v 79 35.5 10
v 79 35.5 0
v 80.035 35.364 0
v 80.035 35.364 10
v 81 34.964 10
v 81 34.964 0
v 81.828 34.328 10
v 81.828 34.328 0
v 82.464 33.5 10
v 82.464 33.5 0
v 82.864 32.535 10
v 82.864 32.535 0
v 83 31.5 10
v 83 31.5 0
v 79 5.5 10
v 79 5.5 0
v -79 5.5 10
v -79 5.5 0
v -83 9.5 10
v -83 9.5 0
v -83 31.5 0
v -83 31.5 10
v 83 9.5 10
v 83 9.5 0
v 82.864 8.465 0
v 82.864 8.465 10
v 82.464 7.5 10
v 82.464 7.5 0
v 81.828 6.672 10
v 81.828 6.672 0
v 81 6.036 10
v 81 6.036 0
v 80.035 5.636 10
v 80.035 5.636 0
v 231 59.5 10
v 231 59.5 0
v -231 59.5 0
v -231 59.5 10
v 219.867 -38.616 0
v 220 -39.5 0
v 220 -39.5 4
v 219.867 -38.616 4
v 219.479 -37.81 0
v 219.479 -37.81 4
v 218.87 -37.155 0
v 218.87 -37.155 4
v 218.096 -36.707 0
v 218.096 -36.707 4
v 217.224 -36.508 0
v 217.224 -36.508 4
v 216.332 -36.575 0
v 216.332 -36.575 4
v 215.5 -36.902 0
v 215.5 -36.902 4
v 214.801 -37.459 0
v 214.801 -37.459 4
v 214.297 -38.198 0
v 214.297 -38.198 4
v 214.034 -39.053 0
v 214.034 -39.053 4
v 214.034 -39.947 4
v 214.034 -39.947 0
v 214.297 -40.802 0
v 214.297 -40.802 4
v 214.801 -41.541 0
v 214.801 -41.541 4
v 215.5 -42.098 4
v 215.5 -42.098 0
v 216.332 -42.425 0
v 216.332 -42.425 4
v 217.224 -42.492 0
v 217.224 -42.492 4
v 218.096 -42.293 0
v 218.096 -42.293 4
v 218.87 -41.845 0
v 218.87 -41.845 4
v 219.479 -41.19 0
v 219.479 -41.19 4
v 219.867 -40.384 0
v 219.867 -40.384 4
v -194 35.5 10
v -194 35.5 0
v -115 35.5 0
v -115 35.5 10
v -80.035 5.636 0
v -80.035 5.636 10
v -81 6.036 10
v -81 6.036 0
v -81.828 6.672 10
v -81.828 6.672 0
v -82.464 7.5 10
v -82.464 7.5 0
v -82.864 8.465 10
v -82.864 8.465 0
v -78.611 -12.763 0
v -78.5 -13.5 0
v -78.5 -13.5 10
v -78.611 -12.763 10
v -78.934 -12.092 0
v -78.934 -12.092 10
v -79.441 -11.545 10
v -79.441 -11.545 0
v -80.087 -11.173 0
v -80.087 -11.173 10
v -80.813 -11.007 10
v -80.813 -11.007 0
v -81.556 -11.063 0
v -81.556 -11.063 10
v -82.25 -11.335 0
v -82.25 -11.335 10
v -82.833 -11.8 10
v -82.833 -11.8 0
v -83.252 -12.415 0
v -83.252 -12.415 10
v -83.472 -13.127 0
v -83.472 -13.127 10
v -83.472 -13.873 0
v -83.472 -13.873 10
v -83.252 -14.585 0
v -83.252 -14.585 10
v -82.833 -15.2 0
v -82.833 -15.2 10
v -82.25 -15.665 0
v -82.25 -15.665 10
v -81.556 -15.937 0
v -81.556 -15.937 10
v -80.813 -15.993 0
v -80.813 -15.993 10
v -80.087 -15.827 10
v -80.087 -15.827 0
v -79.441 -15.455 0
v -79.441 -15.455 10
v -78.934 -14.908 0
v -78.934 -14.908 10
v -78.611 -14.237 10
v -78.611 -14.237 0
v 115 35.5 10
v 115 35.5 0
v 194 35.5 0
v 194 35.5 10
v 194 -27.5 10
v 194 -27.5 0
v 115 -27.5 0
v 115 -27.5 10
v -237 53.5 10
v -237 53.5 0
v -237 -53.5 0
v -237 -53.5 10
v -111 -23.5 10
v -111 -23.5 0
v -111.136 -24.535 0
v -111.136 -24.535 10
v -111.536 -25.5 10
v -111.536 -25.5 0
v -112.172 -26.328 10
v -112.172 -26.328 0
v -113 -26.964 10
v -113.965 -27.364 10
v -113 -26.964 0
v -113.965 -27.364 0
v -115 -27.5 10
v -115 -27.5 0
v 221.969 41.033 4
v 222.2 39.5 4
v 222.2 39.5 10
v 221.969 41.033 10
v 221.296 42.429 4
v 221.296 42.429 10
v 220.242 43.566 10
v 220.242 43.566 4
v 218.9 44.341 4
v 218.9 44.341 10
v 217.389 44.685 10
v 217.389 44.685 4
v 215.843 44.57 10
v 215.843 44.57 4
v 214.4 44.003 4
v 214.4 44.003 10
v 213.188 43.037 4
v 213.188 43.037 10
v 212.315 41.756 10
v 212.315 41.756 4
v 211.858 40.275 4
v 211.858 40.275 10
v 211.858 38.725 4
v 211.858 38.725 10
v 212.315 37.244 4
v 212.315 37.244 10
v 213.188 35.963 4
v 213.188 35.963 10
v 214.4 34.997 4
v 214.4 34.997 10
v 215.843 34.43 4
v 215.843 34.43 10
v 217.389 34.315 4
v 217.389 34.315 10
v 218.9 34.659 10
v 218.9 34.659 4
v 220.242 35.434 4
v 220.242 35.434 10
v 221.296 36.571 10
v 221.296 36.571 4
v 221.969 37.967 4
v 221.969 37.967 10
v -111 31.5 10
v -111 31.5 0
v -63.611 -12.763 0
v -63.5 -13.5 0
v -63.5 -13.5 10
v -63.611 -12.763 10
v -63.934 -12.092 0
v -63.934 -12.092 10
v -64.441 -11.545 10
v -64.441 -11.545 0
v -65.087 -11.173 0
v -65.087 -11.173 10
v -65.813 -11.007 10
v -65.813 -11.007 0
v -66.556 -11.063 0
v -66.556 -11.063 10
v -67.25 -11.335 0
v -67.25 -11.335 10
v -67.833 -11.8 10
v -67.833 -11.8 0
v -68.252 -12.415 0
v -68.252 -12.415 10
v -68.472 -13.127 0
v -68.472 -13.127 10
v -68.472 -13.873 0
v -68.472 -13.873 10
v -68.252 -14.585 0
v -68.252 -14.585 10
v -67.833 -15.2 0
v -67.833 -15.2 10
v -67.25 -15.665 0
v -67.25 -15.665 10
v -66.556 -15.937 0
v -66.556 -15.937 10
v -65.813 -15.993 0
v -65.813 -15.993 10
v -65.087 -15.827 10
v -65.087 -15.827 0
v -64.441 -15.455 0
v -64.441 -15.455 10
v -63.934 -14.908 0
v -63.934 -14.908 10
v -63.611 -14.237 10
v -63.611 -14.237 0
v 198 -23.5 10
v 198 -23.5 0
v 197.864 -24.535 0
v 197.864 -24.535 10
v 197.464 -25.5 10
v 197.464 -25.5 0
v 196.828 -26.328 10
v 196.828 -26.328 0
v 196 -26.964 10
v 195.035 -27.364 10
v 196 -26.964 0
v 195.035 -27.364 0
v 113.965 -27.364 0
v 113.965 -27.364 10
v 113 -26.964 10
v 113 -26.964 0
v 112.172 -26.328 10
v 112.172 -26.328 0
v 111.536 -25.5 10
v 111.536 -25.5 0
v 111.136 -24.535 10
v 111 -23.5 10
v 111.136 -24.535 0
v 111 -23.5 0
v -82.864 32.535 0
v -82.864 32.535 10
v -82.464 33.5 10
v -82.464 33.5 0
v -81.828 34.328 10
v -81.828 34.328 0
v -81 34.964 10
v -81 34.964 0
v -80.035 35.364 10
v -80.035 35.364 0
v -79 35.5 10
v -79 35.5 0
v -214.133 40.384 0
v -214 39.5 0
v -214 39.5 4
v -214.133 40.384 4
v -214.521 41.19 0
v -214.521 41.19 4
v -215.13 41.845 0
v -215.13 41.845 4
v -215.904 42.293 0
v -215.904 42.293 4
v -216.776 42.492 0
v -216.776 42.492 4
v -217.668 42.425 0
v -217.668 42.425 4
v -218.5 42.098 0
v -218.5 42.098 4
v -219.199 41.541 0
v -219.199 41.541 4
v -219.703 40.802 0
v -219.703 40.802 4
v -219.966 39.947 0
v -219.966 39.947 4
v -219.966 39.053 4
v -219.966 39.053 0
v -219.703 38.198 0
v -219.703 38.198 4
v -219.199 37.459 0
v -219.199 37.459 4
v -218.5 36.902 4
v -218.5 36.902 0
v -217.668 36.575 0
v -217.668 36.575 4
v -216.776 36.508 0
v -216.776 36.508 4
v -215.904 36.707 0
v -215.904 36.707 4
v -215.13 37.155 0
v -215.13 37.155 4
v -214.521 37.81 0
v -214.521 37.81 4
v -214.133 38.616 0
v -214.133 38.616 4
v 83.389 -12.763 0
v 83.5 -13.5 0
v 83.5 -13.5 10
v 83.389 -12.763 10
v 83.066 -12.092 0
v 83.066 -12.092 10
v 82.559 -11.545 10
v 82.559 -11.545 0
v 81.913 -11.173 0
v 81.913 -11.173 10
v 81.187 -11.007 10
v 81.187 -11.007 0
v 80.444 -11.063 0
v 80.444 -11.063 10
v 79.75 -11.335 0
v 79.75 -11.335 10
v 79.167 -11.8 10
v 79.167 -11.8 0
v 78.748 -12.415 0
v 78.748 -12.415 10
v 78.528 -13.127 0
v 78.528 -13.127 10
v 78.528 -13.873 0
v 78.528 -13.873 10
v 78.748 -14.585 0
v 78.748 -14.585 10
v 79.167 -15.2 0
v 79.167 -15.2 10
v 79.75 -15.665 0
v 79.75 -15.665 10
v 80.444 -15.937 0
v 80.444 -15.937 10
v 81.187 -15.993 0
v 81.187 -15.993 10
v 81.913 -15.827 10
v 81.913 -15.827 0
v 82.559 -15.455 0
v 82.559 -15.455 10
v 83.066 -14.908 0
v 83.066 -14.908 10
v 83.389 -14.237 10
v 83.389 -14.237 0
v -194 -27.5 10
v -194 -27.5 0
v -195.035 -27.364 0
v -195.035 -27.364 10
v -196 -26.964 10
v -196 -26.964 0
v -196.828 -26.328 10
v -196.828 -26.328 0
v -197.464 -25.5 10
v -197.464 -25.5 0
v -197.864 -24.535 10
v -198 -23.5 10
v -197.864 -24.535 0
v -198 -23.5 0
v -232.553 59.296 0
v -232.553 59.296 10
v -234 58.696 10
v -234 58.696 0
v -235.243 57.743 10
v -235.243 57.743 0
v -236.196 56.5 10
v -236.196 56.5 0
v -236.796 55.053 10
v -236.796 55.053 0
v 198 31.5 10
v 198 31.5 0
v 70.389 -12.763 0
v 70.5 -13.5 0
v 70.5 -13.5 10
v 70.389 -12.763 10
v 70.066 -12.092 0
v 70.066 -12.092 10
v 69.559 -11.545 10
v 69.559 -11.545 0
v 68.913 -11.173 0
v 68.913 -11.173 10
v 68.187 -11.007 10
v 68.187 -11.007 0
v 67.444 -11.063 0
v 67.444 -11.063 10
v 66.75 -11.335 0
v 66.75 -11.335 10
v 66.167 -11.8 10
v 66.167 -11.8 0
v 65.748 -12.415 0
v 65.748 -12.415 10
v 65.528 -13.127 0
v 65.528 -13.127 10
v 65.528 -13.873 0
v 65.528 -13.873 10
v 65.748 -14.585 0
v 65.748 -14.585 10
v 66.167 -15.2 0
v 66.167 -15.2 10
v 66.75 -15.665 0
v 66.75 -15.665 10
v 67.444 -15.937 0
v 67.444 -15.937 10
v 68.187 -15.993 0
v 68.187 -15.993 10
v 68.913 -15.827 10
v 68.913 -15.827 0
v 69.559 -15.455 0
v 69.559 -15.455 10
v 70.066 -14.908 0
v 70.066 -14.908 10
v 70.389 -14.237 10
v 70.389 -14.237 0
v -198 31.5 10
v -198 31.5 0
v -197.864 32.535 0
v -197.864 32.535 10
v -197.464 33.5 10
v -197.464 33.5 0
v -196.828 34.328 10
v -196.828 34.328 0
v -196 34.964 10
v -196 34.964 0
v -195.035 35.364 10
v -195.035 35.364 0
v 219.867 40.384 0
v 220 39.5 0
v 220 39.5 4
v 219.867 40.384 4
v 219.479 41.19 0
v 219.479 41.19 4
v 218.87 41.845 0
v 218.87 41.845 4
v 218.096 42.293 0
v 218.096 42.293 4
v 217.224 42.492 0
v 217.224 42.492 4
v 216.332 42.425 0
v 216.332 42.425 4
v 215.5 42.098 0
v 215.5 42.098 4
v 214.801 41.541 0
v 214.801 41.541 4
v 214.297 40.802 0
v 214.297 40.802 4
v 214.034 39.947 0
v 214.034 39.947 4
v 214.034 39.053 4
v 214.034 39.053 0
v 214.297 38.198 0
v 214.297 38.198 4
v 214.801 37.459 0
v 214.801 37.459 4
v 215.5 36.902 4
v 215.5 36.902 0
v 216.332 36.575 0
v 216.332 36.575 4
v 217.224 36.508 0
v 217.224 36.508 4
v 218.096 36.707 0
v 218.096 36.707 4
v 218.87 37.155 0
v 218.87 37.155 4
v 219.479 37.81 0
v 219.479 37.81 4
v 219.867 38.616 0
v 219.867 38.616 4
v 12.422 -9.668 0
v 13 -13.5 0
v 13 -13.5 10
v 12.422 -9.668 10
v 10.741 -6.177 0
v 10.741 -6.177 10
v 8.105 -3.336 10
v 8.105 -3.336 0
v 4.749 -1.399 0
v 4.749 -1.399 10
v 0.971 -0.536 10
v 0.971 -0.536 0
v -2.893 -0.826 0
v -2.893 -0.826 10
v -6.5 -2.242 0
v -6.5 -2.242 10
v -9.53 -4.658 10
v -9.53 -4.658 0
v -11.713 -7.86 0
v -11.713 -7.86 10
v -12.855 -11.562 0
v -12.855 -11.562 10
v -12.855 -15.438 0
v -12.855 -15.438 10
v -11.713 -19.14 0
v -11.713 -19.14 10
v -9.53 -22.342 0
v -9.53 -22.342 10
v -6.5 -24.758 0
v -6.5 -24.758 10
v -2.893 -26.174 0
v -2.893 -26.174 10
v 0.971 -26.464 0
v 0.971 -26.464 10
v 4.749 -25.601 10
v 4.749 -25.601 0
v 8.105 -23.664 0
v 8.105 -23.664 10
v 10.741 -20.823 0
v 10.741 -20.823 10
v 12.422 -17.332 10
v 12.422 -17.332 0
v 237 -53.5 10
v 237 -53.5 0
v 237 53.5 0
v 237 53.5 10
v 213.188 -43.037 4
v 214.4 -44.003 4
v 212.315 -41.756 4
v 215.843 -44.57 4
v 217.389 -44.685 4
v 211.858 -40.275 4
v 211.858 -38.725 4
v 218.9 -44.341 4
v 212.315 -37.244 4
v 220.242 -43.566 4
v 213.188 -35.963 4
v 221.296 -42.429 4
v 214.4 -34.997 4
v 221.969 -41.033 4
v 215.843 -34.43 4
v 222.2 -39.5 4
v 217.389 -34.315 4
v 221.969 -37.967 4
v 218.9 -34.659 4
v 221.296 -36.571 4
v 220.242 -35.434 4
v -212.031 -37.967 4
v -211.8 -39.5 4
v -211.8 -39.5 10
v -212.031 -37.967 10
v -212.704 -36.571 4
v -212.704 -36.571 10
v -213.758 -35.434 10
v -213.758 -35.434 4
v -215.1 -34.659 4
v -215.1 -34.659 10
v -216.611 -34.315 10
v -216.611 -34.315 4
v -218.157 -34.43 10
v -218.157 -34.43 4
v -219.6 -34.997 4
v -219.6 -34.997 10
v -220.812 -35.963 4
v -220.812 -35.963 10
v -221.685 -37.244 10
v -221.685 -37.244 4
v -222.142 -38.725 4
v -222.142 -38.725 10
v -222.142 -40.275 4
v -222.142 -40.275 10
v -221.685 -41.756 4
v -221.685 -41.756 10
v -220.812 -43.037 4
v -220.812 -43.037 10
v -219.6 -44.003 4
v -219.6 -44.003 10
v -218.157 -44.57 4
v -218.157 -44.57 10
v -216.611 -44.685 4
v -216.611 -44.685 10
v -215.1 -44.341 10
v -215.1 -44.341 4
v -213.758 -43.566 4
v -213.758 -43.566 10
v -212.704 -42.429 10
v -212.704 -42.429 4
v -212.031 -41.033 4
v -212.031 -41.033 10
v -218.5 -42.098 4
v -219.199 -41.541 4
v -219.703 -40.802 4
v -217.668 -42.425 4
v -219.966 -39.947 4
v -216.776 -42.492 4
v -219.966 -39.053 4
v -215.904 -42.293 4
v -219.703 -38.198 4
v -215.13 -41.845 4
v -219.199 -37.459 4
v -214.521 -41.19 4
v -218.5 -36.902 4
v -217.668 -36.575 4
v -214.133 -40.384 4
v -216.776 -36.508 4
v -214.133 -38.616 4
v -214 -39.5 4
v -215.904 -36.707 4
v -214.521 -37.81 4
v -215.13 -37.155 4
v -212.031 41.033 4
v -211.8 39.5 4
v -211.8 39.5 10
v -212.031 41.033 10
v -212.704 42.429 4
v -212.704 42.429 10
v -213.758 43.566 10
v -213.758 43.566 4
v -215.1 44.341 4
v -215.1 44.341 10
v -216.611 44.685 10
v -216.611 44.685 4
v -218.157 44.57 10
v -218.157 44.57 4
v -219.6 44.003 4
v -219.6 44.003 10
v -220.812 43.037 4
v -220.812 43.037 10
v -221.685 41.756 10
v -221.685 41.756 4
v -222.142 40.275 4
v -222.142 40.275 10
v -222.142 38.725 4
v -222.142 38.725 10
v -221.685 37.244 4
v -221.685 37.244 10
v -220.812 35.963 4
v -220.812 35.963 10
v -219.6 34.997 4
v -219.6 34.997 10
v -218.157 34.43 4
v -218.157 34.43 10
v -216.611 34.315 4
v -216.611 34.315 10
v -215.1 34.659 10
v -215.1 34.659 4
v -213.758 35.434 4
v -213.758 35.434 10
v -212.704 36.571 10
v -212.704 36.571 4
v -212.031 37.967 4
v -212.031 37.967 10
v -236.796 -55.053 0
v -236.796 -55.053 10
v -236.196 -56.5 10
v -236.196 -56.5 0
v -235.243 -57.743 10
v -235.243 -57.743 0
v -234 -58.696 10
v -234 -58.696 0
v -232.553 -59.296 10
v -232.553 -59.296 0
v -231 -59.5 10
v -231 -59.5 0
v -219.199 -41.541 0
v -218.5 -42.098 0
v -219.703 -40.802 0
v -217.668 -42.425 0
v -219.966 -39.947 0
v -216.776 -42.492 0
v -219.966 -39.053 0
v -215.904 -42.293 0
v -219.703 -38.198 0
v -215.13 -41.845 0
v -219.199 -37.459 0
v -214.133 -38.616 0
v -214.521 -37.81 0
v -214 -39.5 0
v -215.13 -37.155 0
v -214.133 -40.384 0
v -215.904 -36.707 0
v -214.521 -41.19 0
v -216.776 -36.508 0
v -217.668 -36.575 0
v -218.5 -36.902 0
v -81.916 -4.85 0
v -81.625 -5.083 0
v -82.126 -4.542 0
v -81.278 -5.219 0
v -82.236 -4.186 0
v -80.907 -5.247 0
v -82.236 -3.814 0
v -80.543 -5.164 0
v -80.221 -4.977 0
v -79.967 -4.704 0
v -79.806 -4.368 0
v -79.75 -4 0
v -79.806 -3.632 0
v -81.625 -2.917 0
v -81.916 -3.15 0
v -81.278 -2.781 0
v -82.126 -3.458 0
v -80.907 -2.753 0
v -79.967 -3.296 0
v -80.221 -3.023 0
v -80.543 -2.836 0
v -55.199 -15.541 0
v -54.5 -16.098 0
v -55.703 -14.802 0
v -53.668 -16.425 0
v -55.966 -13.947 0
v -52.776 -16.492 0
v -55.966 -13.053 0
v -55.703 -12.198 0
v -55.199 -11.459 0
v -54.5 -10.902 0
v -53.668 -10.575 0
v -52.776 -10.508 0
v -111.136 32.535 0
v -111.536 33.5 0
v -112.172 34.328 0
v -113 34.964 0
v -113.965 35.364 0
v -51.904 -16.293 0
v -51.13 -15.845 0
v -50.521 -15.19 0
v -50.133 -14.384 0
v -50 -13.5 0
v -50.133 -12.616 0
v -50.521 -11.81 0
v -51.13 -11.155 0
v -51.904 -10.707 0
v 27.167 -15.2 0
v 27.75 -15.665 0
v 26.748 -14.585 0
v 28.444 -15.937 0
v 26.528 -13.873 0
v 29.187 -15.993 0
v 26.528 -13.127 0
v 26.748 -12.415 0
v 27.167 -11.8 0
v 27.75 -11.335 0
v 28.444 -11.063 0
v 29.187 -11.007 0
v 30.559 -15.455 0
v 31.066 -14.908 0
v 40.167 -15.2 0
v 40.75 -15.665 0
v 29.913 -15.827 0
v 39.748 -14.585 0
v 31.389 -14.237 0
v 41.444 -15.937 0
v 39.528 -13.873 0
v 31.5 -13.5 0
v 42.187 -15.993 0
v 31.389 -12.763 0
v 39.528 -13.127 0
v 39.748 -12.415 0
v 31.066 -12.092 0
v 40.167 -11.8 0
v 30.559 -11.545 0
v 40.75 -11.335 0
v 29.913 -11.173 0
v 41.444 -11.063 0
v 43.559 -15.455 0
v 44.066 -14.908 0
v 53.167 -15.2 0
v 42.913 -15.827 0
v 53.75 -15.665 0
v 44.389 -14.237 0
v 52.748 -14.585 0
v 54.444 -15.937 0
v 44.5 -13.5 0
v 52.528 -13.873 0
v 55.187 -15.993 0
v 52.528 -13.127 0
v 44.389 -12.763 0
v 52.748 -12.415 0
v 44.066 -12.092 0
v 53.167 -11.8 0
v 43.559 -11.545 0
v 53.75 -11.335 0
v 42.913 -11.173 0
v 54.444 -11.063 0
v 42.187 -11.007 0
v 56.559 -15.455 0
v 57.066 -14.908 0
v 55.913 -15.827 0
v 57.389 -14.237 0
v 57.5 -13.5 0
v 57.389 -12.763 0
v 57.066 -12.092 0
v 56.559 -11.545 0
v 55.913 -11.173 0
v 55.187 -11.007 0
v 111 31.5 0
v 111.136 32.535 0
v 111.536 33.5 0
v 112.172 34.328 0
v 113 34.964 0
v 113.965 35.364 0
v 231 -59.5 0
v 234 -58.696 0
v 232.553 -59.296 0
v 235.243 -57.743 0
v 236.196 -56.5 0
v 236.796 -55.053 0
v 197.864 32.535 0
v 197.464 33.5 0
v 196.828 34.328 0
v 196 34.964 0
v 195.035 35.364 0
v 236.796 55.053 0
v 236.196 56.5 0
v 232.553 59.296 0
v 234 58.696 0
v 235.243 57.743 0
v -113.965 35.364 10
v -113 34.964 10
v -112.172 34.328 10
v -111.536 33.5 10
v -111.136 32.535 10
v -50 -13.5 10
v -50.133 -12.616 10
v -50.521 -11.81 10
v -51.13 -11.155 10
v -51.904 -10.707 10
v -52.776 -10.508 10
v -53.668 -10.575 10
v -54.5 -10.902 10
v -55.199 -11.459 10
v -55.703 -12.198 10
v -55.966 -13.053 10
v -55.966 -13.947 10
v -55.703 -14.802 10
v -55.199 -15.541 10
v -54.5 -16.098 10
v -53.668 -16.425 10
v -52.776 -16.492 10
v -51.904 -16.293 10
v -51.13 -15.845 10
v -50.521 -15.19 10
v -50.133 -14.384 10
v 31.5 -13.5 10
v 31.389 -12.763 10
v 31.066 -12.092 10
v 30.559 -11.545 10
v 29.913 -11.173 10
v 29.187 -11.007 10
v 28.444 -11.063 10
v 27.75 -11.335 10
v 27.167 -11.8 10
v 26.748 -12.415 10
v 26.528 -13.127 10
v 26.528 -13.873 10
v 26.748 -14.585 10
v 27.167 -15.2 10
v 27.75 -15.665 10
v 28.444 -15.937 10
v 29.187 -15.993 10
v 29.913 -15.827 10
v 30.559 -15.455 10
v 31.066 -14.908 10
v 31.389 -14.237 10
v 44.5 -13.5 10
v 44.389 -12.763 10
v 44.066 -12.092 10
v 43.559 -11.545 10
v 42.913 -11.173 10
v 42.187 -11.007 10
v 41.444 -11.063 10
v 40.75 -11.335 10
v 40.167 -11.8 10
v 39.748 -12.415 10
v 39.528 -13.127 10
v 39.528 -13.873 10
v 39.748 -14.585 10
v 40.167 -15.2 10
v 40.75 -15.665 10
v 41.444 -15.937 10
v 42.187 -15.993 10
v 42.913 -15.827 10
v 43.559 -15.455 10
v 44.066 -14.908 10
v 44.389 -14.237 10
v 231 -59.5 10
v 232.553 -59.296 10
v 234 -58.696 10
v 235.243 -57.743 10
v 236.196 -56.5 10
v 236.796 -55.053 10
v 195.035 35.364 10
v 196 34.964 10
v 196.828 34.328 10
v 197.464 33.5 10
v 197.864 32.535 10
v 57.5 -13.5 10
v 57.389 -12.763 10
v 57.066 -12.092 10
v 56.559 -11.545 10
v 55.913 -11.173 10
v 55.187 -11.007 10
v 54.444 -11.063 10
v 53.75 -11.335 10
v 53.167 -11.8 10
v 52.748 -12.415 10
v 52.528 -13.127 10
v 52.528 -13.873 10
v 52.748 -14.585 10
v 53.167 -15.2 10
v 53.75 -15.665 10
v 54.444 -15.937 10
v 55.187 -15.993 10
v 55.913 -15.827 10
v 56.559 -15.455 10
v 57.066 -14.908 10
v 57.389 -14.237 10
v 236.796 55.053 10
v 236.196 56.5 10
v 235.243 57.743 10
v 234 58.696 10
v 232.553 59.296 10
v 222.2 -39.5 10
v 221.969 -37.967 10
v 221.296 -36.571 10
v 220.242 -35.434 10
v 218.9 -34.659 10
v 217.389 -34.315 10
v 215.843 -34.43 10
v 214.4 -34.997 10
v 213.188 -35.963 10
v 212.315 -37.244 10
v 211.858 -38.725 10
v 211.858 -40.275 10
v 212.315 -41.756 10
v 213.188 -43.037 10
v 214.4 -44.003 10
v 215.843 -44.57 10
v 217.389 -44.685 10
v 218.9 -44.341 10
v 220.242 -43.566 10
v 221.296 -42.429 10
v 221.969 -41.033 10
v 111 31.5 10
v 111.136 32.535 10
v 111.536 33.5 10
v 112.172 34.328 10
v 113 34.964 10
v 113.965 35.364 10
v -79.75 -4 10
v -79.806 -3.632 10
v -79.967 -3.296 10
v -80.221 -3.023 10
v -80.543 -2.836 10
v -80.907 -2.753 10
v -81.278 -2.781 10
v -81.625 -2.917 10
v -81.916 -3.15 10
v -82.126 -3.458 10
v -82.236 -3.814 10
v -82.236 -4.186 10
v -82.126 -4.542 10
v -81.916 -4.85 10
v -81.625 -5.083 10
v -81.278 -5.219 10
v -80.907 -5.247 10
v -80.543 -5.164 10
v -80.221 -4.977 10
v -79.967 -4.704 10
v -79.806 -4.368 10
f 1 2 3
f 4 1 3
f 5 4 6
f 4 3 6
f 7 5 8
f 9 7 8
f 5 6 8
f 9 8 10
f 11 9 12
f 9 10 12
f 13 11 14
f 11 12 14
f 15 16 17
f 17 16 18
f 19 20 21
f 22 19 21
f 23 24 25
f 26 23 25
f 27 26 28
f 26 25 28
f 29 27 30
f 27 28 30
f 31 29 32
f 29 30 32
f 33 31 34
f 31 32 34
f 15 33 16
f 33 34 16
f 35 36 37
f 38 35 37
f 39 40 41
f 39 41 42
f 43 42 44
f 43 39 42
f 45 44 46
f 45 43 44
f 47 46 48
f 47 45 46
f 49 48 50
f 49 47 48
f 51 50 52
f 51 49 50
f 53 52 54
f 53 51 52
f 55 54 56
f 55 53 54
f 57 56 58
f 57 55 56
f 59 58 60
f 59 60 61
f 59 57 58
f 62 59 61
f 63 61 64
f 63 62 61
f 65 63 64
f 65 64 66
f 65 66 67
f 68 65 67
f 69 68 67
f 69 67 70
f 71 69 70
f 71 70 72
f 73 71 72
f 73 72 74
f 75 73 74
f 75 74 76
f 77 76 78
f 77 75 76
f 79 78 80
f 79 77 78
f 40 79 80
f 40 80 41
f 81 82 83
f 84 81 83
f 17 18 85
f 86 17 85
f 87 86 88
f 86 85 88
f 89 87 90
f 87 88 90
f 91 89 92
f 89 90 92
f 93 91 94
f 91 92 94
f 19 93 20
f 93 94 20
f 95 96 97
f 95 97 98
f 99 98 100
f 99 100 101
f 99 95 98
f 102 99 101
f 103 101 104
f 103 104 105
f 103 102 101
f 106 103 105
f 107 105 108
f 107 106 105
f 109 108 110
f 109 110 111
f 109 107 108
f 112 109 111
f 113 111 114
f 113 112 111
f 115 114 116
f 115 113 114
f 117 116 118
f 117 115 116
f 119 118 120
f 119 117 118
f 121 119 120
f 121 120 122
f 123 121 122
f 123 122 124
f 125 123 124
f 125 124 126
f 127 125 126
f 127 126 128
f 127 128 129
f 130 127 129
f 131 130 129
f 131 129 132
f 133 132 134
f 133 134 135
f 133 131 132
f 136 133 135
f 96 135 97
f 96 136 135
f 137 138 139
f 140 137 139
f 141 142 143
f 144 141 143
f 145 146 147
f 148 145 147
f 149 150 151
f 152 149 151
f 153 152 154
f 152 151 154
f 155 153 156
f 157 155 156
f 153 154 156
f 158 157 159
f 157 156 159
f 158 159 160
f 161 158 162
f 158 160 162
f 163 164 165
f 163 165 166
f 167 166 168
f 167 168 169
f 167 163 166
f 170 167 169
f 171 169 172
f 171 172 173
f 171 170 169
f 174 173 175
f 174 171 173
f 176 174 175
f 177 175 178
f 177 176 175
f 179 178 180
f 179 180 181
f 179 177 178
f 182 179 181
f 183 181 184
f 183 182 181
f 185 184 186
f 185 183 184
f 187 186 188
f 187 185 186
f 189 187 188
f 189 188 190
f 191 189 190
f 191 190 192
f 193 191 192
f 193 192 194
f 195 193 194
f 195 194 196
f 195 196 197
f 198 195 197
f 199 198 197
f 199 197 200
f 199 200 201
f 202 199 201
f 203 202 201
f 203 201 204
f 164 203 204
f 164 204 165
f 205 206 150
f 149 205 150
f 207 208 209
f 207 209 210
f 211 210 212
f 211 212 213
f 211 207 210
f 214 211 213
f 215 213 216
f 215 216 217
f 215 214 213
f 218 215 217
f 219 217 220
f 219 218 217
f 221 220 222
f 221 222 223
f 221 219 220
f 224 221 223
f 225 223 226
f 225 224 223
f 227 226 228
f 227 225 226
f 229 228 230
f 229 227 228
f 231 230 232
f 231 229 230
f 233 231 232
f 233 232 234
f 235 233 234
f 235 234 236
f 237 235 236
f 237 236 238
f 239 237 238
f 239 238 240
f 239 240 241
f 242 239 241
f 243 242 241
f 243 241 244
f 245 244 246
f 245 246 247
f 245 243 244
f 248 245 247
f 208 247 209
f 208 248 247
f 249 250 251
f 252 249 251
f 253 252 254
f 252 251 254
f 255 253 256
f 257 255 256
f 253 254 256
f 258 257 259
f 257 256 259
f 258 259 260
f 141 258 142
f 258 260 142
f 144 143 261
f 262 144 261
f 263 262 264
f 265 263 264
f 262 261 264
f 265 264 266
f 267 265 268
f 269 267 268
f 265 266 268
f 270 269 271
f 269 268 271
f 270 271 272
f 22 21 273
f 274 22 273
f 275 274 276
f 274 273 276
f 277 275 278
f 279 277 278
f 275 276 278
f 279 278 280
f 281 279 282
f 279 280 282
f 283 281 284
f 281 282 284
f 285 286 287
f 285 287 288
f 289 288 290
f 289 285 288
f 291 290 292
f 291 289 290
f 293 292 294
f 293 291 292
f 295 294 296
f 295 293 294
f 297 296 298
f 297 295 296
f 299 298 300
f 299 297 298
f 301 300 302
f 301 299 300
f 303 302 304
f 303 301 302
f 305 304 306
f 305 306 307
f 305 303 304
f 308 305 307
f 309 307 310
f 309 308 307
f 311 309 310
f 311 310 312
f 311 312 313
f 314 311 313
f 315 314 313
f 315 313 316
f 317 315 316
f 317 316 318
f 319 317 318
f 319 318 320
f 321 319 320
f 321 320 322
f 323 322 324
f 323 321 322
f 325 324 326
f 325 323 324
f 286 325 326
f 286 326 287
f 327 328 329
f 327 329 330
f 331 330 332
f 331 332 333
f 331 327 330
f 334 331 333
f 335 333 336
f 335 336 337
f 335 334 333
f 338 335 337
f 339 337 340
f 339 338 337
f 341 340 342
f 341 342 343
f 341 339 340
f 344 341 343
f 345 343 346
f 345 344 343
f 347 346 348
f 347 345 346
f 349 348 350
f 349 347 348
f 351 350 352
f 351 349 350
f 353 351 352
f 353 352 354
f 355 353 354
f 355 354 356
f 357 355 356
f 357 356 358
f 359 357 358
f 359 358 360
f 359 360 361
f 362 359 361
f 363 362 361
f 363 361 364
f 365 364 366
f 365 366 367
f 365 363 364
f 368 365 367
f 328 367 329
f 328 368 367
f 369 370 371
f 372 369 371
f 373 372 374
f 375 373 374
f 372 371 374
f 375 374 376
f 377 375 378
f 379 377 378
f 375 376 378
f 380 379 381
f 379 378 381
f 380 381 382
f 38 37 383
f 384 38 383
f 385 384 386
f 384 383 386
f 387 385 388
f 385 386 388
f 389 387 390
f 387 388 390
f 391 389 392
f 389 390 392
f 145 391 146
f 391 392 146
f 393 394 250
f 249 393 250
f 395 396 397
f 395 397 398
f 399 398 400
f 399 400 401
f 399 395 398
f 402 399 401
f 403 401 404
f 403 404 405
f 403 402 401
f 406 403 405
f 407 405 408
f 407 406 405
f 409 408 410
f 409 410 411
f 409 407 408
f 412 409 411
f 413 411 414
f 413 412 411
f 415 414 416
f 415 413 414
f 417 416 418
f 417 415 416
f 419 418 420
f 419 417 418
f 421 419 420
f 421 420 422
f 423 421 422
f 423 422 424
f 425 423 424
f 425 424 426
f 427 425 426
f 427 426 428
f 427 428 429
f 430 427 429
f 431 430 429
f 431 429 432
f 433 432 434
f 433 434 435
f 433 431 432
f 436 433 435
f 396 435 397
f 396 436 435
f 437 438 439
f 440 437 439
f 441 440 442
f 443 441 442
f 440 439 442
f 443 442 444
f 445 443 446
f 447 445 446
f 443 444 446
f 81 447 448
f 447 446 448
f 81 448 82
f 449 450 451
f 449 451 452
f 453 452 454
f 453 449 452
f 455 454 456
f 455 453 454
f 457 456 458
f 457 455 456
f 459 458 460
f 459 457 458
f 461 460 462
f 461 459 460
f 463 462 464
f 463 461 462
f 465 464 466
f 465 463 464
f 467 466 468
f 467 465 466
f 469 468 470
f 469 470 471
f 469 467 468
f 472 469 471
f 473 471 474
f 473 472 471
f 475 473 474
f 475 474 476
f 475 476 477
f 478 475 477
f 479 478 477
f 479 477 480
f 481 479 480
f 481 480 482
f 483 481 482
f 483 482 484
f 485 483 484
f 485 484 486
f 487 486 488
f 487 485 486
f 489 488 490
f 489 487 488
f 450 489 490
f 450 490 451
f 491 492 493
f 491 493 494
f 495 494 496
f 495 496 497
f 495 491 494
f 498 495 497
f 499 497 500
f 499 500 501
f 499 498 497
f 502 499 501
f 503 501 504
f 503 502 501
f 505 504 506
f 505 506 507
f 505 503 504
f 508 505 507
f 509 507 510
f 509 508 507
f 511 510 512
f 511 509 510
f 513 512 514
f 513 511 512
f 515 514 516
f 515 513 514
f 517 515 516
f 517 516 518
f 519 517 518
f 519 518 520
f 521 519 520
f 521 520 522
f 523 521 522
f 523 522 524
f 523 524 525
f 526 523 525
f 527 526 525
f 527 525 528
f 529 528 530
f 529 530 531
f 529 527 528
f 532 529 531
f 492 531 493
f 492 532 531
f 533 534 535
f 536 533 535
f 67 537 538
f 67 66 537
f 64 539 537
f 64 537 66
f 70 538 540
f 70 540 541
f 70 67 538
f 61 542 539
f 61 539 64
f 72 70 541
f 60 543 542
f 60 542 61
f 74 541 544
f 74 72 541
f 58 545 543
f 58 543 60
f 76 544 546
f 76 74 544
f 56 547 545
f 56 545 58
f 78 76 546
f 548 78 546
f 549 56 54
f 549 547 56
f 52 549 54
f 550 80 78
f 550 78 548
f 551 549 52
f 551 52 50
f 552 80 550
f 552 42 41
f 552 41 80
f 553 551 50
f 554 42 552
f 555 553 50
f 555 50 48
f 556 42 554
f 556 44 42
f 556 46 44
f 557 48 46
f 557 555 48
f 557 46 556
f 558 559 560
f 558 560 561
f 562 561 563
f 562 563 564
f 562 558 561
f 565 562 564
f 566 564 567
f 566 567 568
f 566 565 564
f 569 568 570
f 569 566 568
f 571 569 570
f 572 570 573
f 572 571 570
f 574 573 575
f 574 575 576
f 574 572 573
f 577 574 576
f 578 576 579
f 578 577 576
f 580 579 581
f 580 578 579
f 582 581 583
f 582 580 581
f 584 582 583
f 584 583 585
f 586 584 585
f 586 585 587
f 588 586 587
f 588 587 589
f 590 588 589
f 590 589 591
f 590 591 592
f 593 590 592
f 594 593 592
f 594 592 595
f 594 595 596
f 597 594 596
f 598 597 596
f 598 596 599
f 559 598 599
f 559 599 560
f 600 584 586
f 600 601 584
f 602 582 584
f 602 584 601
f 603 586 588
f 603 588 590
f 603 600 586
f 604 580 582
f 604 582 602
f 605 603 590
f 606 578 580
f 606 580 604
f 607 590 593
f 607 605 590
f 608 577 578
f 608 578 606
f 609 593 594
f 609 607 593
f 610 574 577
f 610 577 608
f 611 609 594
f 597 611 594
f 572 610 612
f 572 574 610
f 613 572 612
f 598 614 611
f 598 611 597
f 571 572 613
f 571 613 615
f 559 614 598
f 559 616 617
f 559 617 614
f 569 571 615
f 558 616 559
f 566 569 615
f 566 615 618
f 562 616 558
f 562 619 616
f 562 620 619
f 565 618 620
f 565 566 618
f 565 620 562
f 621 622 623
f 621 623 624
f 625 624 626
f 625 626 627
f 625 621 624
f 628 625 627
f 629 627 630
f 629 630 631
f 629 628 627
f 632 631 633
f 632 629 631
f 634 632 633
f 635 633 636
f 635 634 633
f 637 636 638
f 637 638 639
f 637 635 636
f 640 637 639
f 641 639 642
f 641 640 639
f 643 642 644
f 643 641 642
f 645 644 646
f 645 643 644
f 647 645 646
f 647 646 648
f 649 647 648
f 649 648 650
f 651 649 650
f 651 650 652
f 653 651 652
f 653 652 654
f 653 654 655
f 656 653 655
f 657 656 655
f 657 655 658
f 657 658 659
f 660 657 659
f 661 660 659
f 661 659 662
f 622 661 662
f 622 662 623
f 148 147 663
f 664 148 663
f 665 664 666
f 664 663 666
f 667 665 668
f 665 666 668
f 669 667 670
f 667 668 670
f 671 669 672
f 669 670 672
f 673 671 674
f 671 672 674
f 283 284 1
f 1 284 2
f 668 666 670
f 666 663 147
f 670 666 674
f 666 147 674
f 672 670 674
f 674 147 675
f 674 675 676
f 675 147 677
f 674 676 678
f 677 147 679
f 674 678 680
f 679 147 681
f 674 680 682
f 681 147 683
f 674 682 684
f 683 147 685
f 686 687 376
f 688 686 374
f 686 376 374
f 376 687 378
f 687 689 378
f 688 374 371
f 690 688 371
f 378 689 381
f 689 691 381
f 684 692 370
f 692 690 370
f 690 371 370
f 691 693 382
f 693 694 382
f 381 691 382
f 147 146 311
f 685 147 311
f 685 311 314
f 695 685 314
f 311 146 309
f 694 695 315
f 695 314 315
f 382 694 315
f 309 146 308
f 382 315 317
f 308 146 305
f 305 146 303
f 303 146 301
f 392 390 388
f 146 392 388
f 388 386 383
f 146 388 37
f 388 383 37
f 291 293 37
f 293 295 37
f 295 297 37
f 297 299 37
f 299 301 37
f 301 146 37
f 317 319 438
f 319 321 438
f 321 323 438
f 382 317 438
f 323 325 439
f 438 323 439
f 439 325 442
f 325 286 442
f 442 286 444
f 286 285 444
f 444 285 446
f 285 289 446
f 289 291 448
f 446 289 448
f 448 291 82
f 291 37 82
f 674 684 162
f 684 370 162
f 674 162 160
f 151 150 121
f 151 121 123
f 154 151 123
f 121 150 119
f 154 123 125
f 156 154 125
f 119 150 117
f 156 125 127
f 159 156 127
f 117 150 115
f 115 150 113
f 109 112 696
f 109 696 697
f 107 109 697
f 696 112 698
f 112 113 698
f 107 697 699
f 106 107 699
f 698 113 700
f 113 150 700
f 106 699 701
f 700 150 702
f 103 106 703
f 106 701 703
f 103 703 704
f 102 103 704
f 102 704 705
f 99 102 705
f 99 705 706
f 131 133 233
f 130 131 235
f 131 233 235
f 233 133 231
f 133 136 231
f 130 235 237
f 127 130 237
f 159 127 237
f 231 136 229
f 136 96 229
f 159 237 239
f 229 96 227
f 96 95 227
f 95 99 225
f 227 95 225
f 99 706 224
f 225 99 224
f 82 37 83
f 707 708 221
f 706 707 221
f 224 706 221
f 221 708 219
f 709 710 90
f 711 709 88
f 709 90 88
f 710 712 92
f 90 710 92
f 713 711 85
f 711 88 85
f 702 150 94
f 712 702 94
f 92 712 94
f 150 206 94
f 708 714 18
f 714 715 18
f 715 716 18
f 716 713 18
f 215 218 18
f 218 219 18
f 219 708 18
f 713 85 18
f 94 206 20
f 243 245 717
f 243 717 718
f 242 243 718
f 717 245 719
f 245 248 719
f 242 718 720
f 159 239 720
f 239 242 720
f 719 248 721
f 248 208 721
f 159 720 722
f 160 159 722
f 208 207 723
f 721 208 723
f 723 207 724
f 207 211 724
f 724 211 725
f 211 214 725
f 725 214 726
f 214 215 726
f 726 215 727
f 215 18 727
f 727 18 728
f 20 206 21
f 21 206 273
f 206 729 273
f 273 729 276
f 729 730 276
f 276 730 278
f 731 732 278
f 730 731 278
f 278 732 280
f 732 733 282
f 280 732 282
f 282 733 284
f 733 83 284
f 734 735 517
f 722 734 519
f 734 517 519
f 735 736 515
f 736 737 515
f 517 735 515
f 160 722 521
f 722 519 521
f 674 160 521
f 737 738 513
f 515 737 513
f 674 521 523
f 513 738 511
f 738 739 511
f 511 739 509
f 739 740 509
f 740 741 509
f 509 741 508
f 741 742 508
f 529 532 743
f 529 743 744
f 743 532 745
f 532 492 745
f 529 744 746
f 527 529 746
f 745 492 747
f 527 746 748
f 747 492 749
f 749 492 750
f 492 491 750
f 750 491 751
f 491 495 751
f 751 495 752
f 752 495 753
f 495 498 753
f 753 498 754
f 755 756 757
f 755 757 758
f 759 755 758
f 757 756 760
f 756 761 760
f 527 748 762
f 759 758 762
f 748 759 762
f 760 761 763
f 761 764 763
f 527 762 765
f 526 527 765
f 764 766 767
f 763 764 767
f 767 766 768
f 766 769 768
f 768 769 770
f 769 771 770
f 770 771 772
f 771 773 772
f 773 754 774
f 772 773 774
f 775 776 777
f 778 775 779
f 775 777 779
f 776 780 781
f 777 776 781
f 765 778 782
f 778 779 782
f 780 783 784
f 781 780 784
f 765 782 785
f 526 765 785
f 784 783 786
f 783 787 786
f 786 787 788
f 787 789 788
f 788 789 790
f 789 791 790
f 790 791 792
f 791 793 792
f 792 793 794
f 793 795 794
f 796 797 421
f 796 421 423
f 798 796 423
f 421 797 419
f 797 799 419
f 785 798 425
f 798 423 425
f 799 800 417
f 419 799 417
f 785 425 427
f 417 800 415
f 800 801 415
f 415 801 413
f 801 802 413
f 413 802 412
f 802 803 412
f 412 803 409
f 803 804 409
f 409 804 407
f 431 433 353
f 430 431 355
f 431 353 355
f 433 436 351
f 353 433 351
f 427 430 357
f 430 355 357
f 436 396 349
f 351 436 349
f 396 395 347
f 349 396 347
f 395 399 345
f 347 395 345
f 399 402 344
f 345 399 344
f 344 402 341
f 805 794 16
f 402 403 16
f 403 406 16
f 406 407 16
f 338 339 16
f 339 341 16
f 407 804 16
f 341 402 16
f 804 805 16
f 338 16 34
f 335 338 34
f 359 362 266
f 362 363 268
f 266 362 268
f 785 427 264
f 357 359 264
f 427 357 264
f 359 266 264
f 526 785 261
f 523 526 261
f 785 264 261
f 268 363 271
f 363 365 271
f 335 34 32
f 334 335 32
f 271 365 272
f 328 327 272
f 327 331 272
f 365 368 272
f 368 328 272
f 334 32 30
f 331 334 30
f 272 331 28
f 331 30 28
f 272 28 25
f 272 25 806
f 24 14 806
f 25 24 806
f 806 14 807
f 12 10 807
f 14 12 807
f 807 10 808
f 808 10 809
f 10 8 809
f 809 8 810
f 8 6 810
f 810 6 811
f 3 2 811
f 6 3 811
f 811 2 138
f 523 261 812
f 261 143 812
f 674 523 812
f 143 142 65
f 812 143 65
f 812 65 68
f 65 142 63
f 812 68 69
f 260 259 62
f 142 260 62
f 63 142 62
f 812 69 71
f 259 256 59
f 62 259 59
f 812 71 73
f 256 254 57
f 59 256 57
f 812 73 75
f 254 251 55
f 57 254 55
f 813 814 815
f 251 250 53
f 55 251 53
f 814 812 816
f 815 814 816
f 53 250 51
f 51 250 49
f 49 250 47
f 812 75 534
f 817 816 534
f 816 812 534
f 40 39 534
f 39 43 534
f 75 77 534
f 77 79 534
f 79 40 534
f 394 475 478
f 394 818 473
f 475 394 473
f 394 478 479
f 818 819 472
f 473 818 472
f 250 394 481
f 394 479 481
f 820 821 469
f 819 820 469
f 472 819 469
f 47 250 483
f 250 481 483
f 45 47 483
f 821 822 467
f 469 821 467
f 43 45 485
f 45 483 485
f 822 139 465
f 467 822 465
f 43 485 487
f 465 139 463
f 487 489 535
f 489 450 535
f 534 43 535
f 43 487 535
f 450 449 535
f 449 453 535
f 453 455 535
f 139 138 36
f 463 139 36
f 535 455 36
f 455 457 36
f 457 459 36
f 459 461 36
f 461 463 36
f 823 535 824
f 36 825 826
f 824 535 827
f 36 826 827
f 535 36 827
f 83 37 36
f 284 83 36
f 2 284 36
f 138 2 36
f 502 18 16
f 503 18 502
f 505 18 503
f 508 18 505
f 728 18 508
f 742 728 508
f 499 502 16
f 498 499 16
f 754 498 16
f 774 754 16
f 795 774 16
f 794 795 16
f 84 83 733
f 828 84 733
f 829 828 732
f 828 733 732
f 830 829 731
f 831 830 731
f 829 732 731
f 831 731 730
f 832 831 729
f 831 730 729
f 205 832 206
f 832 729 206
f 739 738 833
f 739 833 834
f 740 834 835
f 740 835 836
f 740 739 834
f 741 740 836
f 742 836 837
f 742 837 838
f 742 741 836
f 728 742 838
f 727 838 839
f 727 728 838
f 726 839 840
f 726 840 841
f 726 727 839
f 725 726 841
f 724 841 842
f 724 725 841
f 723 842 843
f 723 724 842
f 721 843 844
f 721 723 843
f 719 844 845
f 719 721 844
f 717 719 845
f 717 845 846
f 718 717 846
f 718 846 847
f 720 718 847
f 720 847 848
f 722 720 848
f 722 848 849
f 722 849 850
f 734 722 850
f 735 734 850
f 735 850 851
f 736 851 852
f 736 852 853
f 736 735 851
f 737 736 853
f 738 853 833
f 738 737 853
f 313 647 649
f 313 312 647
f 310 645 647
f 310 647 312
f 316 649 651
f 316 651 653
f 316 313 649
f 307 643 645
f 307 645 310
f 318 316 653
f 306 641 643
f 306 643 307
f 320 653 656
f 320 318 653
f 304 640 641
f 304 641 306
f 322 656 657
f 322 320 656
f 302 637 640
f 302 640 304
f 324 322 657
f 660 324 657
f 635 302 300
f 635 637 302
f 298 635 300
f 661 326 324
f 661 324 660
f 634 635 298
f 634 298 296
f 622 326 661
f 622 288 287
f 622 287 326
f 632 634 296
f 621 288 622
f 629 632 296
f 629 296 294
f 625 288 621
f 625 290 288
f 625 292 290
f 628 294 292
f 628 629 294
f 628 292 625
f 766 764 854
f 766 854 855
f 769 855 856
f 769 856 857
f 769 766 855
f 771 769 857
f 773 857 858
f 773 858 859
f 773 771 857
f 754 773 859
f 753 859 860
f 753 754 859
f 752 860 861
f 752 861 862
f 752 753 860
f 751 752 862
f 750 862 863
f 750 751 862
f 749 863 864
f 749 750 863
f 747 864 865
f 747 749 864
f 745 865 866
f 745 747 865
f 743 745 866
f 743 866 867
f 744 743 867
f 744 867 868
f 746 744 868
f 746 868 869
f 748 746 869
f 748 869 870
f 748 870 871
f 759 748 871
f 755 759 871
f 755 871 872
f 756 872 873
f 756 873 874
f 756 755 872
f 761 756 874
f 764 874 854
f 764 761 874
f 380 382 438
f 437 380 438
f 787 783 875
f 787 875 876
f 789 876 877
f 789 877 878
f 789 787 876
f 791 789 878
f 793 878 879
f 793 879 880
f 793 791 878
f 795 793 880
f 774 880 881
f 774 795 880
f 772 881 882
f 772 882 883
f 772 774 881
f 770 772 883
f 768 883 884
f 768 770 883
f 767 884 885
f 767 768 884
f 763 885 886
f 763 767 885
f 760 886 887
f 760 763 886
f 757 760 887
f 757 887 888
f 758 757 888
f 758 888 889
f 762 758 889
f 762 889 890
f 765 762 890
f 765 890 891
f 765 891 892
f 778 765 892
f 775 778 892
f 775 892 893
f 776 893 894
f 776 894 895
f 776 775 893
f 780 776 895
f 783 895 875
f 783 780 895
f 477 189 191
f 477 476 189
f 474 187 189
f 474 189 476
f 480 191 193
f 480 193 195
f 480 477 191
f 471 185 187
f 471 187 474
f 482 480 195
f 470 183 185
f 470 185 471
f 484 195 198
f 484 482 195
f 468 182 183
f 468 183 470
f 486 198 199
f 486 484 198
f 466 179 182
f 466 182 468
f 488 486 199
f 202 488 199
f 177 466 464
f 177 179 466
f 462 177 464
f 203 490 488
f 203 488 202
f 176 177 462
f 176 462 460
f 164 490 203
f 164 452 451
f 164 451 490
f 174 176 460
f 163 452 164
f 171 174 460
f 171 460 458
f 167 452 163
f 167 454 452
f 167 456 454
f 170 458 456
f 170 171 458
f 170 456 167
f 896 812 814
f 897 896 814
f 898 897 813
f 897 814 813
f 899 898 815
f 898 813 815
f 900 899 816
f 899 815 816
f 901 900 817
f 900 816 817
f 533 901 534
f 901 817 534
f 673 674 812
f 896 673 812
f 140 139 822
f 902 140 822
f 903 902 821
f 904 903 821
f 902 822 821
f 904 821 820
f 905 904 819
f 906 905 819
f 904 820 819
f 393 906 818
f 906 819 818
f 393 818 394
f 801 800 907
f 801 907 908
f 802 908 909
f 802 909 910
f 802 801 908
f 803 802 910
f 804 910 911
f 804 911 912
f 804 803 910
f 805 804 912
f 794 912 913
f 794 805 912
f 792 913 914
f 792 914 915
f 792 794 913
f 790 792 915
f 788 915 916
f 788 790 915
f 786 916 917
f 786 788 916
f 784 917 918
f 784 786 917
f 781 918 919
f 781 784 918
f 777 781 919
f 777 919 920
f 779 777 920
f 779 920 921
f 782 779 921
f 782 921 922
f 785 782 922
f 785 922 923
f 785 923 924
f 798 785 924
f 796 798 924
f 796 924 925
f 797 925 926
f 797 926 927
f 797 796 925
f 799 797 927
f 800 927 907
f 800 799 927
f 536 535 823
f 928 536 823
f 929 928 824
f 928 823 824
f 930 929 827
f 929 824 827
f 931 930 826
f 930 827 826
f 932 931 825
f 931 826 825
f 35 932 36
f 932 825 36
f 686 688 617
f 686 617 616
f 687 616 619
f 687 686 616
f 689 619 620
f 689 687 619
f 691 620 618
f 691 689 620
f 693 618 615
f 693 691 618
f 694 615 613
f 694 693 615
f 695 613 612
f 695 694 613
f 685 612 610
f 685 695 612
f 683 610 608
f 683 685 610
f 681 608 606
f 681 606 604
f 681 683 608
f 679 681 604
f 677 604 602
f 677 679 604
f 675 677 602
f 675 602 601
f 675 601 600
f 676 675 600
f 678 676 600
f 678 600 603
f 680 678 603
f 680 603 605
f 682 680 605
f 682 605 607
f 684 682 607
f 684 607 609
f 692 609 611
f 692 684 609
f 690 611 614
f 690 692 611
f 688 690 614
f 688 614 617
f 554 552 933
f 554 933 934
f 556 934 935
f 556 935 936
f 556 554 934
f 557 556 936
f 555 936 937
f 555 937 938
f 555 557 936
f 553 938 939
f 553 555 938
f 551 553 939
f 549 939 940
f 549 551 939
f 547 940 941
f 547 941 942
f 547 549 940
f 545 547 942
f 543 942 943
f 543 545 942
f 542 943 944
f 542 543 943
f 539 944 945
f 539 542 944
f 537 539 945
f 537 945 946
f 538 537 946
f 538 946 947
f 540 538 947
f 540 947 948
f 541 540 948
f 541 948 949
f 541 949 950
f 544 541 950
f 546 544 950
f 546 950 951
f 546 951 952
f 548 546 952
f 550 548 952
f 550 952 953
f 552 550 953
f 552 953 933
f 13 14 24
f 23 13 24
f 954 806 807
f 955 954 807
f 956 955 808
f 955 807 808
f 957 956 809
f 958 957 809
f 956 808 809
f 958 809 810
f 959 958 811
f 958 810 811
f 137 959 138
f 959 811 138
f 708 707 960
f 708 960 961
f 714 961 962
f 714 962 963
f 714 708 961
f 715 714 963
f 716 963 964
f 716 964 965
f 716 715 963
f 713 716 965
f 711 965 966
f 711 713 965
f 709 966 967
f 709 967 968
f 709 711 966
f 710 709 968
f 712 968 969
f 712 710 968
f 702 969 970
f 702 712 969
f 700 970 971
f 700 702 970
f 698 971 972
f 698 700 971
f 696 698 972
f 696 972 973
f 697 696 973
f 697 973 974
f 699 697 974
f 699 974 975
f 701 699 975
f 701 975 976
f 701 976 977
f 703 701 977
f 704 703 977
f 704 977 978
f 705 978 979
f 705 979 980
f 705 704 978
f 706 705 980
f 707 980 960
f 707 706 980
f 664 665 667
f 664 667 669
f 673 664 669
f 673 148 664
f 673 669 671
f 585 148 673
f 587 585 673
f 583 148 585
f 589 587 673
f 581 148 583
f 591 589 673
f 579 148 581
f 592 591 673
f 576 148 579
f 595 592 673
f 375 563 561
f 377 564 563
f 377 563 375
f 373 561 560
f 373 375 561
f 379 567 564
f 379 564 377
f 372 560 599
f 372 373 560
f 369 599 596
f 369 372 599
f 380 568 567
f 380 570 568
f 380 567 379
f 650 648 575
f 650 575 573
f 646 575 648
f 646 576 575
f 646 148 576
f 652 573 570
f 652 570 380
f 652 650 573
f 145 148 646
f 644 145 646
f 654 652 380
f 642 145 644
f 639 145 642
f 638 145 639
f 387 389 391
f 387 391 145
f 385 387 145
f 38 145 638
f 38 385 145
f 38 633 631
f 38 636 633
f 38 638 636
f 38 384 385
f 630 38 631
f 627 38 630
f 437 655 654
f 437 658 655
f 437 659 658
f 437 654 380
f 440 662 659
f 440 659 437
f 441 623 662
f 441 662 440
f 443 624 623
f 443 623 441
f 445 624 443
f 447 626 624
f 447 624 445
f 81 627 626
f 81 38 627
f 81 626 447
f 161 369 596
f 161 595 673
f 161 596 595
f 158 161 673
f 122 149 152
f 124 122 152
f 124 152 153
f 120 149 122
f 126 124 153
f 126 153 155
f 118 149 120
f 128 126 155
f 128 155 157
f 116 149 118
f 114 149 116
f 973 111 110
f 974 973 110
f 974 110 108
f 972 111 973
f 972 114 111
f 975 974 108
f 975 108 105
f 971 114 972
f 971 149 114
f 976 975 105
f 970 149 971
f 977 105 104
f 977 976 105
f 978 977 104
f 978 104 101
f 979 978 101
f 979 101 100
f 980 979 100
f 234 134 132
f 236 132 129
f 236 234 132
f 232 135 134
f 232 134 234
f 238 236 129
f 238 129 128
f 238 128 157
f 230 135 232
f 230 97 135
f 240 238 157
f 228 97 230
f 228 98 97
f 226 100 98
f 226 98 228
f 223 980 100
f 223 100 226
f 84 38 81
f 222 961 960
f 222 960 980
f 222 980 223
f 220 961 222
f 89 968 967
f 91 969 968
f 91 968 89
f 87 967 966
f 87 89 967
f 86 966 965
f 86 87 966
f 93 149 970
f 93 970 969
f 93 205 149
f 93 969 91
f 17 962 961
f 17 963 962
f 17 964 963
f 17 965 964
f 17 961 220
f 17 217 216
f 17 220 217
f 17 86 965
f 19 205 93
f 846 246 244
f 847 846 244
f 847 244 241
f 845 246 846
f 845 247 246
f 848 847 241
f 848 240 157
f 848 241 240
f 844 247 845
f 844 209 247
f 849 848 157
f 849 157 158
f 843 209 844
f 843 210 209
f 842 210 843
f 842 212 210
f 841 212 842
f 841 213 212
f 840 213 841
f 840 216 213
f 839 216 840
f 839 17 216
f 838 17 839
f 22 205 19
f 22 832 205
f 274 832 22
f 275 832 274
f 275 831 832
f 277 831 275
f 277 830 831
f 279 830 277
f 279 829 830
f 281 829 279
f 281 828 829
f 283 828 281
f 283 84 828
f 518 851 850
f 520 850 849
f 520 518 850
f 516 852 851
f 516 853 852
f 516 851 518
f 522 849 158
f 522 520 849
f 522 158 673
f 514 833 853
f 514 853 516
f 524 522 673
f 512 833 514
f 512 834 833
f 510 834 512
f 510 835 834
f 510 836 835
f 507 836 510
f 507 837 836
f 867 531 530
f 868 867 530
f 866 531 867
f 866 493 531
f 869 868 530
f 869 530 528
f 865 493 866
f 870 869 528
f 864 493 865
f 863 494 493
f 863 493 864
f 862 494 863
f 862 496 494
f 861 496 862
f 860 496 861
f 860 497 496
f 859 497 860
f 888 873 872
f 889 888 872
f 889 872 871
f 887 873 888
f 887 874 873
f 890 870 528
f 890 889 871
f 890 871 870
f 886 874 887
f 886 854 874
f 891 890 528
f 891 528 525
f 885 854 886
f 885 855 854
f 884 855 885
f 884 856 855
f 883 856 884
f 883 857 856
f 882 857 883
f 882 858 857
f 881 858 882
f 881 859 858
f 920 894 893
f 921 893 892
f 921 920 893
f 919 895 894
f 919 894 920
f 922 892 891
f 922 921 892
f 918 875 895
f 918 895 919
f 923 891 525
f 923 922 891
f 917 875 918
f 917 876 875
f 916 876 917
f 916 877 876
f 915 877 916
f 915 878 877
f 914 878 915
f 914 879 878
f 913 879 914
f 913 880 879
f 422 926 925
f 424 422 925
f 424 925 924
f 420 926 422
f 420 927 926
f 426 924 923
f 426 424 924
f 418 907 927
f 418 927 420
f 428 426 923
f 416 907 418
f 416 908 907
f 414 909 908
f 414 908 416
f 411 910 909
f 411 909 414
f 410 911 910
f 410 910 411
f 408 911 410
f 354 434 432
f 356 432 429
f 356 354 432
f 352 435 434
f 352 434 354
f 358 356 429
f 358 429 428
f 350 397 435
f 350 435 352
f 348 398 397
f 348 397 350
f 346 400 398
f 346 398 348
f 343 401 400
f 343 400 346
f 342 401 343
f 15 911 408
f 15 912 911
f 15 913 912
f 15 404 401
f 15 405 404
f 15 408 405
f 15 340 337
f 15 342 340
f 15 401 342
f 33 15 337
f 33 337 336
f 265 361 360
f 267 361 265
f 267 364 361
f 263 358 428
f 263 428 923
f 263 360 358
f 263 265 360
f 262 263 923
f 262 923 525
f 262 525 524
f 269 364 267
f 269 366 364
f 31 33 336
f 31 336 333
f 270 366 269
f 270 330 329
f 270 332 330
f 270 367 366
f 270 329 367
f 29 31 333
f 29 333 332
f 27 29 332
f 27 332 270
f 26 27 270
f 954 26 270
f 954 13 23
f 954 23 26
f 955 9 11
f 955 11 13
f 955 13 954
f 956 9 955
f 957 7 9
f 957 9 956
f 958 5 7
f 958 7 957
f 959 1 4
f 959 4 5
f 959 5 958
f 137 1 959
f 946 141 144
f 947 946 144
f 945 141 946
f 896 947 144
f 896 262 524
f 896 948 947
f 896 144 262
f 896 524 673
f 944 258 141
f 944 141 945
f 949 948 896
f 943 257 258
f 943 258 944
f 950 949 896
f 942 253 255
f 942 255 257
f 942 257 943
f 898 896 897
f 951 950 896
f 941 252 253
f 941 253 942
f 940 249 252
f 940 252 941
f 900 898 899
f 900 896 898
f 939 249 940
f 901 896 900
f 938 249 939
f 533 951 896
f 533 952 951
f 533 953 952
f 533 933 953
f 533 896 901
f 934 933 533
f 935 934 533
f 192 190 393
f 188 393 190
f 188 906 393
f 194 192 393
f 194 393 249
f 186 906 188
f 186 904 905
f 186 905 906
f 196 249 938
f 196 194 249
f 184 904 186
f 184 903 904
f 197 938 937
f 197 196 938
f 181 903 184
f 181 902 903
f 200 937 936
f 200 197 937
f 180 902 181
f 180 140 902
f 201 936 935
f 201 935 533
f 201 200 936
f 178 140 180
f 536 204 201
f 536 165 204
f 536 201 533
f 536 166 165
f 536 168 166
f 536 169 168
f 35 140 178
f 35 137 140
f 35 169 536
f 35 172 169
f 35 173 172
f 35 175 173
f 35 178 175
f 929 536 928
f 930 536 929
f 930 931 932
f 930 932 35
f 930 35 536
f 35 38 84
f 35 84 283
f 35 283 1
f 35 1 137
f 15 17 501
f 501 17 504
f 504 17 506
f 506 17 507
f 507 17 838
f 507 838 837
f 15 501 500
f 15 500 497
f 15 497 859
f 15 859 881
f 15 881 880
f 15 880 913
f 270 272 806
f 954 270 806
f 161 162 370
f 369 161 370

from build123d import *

# Parameters (mm, degrees)
F0_R     = 5.2
F0_R_2   = 2.5
F0_R_3   = 1.25
F0_R_4   = 3
F0_R_5   = 13
F1_DEPTH = 10
F2_DEPTH = 4


with BuildPart() as f1:
    # F0 (on Top) → F1 (new body)
    with BuildSketch(Plane.XY):
        with BuildLine():
            Line((-231, -59.5), (231, -59.5))
            ThreePointArc((231, -59.5), (235.242641, -57.742641), (237, -53.5))
            Line((237, -53.5), (237, 53.5))
            ThreePointArc((237, 53.5), (235.242641, 57.742641), (231, 59.5))
            Line((231, 59.5), (-231, 59.5))
            ThreePointArc((-231, 59.5), (-235.242641, 57.742641), (-237, 53.5))
            Line((-237, 53.5), (-237, -53.5))
            ThreePointArc((-237, -53.5), (-235.242641, -57.742641), (-231, -59.5))
        make_face()
        with Locations((-217, -39.5)):
            Circle(F0_R, mode=Mode.SUBTRACT)
        with Locations((-81, -13.5)):
            Circle(F0_R_2, mode=Mode.SUBTRACT)
        with Locations((-66, -13.5)):
            Circle(F0_R_2, mode=Mode.SUBTRACT)
        with Locations((-81, -4)):
            Circle(F0_R_3, mode=Mode.SUBTRACT)
        with Locations((-53, -13.5)):
            Circle(F0_R_4, mode=Mode.SUBTRACT)
        with Locations((0, -13.5)):
            Circle(F0_R_5, mode=Mode.SUBTRACT)
        with Locations((217, -39.5)):
            Circle(F0_R, mode=Mode.SUBTRACT)
        with Locations((29, -13.5)):
            Circle(F0_R_2, mode=Mode.SUBTRACT)
        with Locations((42, -13.5)):
            Circle(F0_R_2, mode=Mode.SUBTRACT)
        with Locations((55, -13.5)):
            Circle(F0_R_2, mode=Mode.SUBTRACT)
        with Locations((68, -13.5)):
            Circle(F0_R_2, mode=Mode.SUBTRACT)
        with Locations((81, -13.5)):
            Circle(F0_R_2, mode=Mode.SUBTRACT)
        with BuildLine():
            ThreePointArc((-198, 31.5), (-196.828427, 34.328427), (-194, 35.5))
            Line((-194, 35.5), (-115, 35.5))
            ThreePointArc((-115, 35.5), (-112.171573, 34.328427), (-111, 31.5))
            Line((-111, 31.5), (-111, -23.5))
            ThreePointArc((-111, -23.5), (-112.171573, -26.328427), (-115, -27.5))
            Line((-115, -27.5), (-194, -27.5))
            ThreePointArc((-194, -27.5), (-196.828427, -26.328427), (-198, -23.5))
            Line((-198, -23.5), (-198, 31.5))
        make_face(mode=Mode.SUBTRACT)
        with BuildLine():
            Line((-79, 35.5), (79, 35.5))
            ThreePointArc((79, 35.5), (81.828427, 34.328427), (83, 31.5))
            Line((83, 31.5), (83, 9.5))
            ThreePointArc((83, 9.5), (81.828427, 6.671573), (79, 5.5))
            Line((79, 5.5), (-79, 5.5))
            ThreePointArc((-79, 5.5), (-81.828427, 6.671573), (-83, 9.5))
            Line((-83, 9.5), (-83, 31.5))
            ThreePointArc((-83, 31.5), (-81.828427, 34.328427), (-79, 35.5))
        make_face(mode=Mode.SUBTRACT)
        with Locations((-217, 39.5)):
            Circle(F0_R, mode=Mode.SUBTRACT)
        with BuildLine():
            Line((111, -23.5), (111, 31.5))
            ThreePointArc((111, 31.5), (112.171573, 34.328427), (115, 35.5))
            Line((115, 35.5), (194, 35.5))
            ThreePointArc((194, 35.5), (196.828427, 34.328427), (198, 31.5))
            Line((198, 31.5), (198, -23.5))
            ThreePointArc((198, -23.5), (196.828427, -26.328427), (194, -27.5))
            Line((194, -27.5), (115, -27.5))
            ThreePointArc((115, -27.5), (112.171573, -26.328427), (111, -23.5))
        make_face(mode=Mode.SUBTRACT)
        with Locations((217, 39.5)):
            Circle(F0_R, mode=Mode.SUBTRACT)
    extrude(amount=F1_DEPTH)

    # F0 (on Top) → F2 (join)
    with BuildSketch(Plane.XY):
        with Locations((-217, 39.5)):
            Circle(F0_R)
        with Locations((-217, 39.5)):
            Circle(F0_R_4, mode=Mode.SUBTRACT)
        with Locations((-217, -39.5)):
            Circle(F0_R)
        with Locations((-217, -39.5)):
            Circle(F0_R_4, mode=Mode.SUBTRACT)
        with Locations((217, -39.5)):
            Circle(F0_R)
        with Locations((217, -39.5)):
            Circle(F0_R_4, mode=Mode.SUBTRACT)
        with Locations((217, 39.5)):
            Circle(F0_R)
        with Locations((217, 39.5)):
            Circle(F0_R_4, mode=Mode.SUBTRACT)
    extrude(amount=F2_DEPTH)


solid = f1.part
